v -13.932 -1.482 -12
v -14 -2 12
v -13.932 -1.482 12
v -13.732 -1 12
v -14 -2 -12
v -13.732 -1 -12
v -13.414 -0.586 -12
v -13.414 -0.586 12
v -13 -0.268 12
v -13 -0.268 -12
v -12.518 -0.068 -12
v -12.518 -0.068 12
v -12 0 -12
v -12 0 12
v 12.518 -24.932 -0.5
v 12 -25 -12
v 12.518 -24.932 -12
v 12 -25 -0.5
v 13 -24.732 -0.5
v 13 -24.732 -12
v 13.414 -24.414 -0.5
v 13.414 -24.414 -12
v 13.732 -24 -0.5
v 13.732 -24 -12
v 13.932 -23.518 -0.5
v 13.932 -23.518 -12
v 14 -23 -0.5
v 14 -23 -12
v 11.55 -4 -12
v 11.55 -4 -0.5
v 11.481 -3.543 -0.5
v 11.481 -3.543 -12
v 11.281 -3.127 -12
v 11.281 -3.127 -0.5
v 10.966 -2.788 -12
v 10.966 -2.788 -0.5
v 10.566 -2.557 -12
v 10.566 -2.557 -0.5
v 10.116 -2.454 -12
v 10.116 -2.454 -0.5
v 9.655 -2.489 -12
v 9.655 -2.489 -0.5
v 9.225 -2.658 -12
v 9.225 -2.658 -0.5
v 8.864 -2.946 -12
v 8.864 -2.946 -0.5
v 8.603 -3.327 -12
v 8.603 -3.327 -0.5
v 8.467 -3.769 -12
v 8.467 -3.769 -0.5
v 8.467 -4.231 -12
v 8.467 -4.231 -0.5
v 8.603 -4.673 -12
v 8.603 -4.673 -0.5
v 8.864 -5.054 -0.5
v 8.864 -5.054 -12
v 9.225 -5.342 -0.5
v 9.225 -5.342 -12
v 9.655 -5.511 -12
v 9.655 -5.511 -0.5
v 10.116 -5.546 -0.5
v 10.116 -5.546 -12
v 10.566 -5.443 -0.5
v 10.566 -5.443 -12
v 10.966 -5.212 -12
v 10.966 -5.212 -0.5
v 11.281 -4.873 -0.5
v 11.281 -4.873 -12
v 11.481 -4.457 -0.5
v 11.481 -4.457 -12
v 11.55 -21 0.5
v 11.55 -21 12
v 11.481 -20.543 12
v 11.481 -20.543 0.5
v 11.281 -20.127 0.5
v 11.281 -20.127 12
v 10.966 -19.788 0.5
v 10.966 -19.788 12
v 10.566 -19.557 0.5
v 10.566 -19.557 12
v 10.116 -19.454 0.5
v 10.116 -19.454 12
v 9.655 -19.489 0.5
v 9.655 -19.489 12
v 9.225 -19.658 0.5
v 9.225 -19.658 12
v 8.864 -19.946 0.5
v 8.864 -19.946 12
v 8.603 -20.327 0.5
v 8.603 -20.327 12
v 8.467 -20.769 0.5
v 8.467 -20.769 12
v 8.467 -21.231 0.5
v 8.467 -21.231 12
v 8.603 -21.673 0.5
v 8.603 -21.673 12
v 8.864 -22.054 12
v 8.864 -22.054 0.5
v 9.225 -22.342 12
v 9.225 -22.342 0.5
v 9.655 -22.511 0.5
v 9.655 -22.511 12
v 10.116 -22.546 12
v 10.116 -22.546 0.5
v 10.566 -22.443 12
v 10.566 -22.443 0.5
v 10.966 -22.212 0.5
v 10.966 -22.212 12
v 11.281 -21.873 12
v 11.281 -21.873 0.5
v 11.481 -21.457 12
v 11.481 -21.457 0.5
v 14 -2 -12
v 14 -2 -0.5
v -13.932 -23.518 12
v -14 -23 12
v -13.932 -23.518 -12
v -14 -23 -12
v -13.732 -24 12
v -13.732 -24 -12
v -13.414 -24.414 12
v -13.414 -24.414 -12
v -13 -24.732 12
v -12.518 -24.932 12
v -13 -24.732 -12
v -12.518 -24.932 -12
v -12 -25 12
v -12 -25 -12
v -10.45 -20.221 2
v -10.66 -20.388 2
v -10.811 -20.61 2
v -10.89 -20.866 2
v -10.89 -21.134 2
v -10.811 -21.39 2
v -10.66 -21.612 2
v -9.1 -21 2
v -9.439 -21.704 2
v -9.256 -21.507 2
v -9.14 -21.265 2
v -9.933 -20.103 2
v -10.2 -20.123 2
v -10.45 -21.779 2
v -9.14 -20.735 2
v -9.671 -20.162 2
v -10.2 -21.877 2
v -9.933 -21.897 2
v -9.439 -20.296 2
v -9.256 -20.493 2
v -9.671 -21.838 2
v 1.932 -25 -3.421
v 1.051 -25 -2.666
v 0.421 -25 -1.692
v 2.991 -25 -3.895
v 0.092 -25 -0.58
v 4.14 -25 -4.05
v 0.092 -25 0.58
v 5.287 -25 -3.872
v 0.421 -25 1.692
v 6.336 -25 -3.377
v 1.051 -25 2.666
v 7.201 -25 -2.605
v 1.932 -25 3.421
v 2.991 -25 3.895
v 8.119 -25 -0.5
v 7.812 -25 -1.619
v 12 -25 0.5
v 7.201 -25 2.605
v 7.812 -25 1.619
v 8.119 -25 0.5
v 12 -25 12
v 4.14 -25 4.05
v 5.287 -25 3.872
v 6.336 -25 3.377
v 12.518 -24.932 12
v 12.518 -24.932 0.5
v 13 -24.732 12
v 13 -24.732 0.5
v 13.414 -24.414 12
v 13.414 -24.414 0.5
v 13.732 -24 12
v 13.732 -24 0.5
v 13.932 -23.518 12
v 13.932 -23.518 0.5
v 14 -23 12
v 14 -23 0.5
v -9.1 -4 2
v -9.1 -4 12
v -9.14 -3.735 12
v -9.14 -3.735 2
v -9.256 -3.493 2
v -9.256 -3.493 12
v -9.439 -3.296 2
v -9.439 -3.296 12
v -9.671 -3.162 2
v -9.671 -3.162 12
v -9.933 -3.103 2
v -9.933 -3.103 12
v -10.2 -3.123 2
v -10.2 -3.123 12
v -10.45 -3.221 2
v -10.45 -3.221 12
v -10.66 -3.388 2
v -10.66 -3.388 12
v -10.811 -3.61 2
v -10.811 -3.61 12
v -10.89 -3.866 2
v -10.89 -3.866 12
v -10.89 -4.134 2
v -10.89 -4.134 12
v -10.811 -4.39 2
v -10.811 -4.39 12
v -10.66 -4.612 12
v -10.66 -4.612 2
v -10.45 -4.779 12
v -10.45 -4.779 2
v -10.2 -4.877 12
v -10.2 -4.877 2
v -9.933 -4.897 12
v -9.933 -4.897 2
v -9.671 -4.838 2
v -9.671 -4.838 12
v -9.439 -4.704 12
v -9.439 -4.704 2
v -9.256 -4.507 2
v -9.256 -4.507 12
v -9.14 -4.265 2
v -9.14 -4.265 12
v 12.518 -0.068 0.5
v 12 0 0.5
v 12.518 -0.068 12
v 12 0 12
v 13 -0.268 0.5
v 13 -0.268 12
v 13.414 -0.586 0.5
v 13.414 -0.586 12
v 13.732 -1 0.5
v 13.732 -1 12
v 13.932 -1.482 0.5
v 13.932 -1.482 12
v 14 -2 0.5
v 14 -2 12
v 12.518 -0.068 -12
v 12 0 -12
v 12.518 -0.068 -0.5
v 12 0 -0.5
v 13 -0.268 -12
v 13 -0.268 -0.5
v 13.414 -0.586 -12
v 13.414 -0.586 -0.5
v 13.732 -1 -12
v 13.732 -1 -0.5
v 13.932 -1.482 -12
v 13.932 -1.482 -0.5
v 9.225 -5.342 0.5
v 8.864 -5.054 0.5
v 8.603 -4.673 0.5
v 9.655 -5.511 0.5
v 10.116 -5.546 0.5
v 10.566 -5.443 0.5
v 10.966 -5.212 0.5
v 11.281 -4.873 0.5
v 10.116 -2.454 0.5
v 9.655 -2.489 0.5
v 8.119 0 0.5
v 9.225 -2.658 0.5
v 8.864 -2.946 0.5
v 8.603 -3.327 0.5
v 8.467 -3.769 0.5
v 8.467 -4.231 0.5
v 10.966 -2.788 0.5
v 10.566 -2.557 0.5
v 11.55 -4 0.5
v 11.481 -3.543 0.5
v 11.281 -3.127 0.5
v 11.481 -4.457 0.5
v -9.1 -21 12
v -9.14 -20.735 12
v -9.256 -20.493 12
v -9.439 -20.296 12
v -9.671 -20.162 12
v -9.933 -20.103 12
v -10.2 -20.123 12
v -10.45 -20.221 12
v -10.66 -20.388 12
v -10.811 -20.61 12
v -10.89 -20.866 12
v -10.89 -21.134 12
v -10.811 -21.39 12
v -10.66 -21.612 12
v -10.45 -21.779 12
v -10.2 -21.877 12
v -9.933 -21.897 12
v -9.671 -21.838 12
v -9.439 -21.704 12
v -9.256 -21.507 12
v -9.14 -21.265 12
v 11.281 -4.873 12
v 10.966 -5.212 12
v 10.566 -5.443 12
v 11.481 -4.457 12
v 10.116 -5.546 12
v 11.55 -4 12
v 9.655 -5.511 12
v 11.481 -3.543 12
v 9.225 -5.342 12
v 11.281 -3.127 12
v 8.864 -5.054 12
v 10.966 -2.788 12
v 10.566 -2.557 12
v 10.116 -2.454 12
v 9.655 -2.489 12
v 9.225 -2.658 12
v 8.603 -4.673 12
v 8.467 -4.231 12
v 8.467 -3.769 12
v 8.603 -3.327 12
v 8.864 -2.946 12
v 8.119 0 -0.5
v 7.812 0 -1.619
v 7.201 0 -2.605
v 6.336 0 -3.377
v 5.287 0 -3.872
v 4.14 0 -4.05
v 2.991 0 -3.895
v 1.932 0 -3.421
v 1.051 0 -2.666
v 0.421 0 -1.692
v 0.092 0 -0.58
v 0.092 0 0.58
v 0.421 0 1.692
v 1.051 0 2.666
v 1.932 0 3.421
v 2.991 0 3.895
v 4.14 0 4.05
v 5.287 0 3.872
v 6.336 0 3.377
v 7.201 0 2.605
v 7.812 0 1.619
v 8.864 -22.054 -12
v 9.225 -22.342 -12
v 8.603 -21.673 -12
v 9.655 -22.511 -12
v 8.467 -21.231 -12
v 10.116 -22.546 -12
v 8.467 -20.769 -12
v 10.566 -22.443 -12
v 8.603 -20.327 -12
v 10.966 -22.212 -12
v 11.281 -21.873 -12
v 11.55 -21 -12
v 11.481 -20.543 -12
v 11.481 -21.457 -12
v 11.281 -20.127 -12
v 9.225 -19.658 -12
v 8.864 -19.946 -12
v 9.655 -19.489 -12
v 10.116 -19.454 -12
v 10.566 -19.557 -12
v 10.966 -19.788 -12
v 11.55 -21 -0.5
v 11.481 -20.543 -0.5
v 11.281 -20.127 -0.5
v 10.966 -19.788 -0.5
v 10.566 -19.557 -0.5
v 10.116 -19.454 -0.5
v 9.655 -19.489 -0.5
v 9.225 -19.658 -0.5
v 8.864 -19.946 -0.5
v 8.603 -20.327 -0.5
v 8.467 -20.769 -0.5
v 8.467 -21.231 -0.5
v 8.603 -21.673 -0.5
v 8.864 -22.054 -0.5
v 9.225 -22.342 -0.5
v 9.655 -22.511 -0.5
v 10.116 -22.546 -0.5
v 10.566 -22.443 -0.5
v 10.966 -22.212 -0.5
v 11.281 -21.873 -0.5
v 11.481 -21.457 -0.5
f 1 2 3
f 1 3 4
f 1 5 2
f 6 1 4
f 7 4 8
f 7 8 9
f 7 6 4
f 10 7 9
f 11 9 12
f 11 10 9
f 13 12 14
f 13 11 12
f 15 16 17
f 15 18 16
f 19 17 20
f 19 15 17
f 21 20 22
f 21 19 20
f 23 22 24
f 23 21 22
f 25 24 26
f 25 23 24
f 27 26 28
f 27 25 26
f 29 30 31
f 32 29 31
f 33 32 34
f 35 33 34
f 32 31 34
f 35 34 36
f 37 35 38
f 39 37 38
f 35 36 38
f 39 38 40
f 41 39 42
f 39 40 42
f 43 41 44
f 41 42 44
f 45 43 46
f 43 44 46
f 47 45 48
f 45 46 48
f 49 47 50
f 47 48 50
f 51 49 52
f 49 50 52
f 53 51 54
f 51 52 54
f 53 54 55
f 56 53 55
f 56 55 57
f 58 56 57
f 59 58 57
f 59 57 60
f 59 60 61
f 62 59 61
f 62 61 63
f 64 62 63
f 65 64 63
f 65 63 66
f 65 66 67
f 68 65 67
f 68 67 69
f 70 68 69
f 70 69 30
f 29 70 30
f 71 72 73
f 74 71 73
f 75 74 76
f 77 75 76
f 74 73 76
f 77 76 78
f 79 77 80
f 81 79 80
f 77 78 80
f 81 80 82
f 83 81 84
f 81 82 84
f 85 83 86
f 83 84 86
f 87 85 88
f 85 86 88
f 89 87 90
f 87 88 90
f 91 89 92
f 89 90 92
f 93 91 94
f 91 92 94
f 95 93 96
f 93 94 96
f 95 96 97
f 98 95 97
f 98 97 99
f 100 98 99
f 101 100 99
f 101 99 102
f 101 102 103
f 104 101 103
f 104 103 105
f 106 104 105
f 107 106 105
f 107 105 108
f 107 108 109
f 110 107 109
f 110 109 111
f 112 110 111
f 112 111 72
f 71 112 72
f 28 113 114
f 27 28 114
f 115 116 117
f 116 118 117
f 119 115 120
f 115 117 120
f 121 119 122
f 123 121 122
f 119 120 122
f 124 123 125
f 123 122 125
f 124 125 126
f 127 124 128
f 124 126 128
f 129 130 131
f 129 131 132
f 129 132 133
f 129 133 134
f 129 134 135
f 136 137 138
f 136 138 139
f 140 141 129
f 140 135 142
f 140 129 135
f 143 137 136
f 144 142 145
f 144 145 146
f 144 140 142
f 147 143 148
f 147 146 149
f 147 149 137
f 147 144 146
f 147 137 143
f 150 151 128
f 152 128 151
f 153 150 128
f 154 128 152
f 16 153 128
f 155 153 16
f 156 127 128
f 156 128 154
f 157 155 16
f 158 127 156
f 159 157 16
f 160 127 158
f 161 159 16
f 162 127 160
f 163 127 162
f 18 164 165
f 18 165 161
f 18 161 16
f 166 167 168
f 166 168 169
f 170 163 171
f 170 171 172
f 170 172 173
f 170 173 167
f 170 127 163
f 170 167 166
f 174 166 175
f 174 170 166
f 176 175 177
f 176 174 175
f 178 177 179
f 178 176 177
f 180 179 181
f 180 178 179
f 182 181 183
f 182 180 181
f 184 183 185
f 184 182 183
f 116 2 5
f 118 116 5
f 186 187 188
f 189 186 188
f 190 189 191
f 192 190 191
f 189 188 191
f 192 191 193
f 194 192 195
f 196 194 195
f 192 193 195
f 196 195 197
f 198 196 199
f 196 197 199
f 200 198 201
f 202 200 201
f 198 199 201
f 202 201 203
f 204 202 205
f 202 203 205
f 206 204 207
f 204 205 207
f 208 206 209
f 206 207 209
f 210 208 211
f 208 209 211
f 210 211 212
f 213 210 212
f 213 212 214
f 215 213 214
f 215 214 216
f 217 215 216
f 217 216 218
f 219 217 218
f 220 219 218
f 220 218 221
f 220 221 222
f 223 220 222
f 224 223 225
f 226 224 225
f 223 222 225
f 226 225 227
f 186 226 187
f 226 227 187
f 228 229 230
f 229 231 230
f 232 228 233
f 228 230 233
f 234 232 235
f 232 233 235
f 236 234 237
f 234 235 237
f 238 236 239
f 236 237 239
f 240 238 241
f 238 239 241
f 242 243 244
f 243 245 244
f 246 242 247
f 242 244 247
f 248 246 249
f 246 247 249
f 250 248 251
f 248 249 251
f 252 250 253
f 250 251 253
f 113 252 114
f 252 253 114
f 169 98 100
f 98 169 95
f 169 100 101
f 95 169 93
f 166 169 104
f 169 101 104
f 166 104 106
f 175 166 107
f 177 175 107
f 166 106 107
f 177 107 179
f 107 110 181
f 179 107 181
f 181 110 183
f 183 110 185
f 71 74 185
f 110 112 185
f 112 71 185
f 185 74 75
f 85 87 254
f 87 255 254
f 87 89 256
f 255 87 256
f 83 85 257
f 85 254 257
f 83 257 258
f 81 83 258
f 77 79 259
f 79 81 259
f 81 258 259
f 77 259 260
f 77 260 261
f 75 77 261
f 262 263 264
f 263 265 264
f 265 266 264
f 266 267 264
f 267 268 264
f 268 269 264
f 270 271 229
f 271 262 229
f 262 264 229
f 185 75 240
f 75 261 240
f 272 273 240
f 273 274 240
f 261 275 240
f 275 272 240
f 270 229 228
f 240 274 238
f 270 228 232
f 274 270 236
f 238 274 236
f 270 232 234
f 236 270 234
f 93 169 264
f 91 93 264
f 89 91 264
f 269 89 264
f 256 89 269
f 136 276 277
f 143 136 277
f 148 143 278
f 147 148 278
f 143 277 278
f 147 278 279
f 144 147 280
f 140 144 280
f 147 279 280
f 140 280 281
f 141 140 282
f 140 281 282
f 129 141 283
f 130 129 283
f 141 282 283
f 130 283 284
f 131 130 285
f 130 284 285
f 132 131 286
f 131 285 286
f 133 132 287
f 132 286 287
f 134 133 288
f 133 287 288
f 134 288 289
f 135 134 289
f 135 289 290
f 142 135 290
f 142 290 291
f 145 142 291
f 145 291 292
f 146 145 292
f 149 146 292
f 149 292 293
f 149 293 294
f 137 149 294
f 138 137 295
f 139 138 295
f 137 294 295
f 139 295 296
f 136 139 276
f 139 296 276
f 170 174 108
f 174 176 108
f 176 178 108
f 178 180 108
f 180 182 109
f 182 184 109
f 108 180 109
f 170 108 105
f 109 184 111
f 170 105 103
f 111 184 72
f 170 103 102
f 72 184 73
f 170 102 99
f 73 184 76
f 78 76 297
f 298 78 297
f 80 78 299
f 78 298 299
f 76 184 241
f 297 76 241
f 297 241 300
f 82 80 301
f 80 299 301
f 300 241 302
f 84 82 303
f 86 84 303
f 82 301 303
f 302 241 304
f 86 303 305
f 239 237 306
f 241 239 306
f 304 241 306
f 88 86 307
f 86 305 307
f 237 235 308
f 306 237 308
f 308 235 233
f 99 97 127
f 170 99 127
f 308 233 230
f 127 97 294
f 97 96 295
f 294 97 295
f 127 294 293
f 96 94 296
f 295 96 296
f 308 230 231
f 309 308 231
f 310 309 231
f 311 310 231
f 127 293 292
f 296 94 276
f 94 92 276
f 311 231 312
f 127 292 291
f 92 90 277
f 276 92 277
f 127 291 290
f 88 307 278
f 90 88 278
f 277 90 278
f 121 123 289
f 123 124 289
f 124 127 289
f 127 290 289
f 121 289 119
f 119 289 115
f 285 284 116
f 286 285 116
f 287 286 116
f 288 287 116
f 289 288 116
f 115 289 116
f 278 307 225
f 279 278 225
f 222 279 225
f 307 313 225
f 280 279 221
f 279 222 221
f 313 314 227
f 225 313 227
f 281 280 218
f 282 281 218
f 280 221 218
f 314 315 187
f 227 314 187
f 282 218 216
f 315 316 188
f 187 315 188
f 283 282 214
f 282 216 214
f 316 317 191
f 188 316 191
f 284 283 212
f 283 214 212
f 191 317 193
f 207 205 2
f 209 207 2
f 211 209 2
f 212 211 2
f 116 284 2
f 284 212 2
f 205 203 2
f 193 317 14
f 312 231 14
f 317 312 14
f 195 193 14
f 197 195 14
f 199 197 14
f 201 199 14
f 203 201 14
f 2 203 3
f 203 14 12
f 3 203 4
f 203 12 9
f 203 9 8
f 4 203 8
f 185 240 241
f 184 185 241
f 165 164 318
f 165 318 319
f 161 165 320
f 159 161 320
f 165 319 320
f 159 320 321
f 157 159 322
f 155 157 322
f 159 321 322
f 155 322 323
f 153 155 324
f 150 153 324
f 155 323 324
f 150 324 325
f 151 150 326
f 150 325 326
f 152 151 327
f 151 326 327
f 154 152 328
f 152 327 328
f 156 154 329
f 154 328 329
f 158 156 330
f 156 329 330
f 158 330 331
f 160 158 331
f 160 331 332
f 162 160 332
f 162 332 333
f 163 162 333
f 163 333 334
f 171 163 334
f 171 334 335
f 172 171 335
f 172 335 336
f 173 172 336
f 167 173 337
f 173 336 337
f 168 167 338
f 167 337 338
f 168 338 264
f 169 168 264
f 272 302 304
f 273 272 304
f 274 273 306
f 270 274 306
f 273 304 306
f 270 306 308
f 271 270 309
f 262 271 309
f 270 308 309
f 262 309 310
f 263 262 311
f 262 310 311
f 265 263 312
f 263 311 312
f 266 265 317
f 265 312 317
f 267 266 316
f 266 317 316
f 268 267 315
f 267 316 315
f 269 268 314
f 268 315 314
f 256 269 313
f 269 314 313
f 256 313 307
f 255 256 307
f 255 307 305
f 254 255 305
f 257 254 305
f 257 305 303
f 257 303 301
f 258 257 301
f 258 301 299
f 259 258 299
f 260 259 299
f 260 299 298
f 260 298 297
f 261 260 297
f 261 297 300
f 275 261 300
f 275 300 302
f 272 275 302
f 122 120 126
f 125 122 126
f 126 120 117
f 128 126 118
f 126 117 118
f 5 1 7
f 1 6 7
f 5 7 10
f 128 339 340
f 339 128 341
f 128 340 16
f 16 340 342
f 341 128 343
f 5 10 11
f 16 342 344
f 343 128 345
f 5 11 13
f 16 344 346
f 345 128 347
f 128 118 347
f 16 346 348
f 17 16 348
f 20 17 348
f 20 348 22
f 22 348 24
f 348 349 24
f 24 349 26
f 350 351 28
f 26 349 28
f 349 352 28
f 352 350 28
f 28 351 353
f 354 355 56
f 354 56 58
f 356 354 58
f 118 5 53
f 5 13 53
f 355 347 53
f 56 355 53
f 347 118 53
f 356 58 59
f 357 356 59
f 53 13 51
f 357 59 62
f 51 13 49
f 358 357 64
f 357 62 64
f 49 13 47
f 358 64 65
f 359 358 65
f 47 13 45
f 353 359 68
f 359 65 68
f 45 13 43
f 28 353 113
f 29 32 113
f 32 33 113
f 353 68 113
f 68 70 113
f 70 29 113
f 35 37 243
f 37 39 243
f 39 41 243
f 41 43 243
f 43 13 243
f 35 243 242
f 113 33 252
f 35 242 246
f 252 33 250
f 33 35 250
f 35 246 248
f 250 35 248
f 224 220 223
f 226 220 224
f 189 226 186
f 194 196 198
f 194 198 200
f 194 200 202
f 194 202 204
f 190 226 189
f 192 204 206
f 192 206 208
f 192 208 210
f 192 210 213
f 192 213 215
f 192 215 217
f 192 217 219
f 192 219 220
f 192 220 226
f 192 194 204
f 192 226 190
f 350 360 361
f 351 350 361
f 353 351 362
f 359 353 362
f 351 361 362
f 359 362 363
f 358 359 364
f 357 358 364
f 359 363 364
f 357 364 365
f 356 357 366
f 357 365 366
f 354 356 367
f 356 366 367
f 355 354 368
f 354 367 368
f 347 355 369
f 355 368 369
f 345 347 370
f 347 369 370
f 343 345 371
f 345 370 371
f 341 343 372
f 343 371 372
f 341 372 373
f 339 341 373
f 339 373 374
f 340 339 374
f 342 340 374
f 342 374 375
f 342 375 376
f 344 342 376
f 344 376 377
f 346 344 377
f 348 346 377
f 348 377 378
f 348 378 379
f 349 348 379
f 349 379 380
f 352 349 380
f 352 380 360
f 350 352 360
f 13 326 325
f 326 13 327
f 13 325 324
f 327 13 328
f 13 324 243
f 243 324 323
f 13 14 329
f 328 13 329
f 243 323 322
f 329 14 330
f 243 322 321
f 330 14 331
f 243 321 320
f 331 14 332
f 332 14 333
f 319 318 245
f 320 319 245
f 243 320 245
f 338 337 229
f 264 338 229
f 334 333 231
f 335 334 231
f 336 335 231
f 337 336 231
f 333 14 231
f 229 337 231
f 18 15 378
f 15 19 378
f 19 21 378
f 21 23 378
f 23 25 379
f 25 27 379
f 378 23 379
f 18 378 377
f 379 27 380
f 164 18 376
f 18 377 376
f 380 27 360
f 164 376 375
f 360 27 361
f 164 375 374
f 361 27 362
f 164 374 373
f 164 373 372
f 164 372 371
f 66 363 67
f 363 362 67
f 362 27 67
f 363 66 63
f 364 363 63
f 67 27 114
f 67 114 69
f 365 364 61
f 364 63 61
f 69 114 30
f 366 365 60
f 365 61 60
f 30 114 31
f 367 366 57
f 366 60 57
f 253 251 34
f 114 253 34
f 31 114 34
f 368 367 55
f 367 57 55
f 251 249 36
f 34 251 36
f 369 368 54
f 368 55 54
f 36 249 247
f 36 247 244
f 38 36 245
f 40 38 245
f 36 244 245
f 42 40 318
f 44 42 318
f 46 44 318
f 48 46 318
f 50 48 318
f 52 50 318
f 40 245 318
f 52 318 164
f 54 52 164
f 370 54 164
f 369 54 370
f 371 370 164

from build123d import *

# Parameters (mm, degrees)
F1_DEPTH = 25
F2_R     = 0.9
F3_DEPTH = 10
F2_R_2   = 1.55
F4_DEPTH = 24.001
F5_R     = 2


with BuildPart() as f1:
    # F0 (on Front) → F1 (new body)
    with BuildSketch(Plane.XZ):
        with BuildLine():
            Line((-14, -12), (14, -12))
            Line((14, -12), (14, -0.5))
            Line((14, -0.5), (8.119017, -0.5))
            ThreePointArc((8.119017, -0.5), (0.05, 0), (8.119017, 0.5))
            Line((8.119017, 0.5), (14, 0.5))
            Line((14, 0.5), (14, 12))
            Line((14, 12), (-14, 12))
            Line((-14, 12), (-14, -12))
        make_face()
    extrude(amount=F1_DEPTH)

    # F2 (on face) → F3 (cut)
    with BuildSketch(Plane.XY.offset(12)):
        with Locations((-10, -4)):
            Circle(F2_R)
        with Locations((-10, -21)):
            Circle(F2_R)
    extrude(amount=-F3_DEPTH, mode=Mode.SUBTRACT)

    # F2 (on face) → F4 (cut, through all)
    with BuildSketch(Plane.XY.offset(12)):
        with Locations((10, -21)):
            Circle(F2_R_2)
        with Locations((10, -4)):
            Circle(F2_R_2)
    extrude(amount=-F4_DEPTH, mode=Mode.SUBTRACT)

    # F5
    f5_edges = [f1.edges().sort_by_distance(p)[0] for p in [
        (-14, 0, 0),
        (14, -25, -6.25),
        (14, -25, 6.25),
        (14, 0, 6.25),
        (14, 0, -6.25),
        (-14, -25, 0),
    ]]
    fillet(f5_edges, radius=F5_R)


solid = f1.part
